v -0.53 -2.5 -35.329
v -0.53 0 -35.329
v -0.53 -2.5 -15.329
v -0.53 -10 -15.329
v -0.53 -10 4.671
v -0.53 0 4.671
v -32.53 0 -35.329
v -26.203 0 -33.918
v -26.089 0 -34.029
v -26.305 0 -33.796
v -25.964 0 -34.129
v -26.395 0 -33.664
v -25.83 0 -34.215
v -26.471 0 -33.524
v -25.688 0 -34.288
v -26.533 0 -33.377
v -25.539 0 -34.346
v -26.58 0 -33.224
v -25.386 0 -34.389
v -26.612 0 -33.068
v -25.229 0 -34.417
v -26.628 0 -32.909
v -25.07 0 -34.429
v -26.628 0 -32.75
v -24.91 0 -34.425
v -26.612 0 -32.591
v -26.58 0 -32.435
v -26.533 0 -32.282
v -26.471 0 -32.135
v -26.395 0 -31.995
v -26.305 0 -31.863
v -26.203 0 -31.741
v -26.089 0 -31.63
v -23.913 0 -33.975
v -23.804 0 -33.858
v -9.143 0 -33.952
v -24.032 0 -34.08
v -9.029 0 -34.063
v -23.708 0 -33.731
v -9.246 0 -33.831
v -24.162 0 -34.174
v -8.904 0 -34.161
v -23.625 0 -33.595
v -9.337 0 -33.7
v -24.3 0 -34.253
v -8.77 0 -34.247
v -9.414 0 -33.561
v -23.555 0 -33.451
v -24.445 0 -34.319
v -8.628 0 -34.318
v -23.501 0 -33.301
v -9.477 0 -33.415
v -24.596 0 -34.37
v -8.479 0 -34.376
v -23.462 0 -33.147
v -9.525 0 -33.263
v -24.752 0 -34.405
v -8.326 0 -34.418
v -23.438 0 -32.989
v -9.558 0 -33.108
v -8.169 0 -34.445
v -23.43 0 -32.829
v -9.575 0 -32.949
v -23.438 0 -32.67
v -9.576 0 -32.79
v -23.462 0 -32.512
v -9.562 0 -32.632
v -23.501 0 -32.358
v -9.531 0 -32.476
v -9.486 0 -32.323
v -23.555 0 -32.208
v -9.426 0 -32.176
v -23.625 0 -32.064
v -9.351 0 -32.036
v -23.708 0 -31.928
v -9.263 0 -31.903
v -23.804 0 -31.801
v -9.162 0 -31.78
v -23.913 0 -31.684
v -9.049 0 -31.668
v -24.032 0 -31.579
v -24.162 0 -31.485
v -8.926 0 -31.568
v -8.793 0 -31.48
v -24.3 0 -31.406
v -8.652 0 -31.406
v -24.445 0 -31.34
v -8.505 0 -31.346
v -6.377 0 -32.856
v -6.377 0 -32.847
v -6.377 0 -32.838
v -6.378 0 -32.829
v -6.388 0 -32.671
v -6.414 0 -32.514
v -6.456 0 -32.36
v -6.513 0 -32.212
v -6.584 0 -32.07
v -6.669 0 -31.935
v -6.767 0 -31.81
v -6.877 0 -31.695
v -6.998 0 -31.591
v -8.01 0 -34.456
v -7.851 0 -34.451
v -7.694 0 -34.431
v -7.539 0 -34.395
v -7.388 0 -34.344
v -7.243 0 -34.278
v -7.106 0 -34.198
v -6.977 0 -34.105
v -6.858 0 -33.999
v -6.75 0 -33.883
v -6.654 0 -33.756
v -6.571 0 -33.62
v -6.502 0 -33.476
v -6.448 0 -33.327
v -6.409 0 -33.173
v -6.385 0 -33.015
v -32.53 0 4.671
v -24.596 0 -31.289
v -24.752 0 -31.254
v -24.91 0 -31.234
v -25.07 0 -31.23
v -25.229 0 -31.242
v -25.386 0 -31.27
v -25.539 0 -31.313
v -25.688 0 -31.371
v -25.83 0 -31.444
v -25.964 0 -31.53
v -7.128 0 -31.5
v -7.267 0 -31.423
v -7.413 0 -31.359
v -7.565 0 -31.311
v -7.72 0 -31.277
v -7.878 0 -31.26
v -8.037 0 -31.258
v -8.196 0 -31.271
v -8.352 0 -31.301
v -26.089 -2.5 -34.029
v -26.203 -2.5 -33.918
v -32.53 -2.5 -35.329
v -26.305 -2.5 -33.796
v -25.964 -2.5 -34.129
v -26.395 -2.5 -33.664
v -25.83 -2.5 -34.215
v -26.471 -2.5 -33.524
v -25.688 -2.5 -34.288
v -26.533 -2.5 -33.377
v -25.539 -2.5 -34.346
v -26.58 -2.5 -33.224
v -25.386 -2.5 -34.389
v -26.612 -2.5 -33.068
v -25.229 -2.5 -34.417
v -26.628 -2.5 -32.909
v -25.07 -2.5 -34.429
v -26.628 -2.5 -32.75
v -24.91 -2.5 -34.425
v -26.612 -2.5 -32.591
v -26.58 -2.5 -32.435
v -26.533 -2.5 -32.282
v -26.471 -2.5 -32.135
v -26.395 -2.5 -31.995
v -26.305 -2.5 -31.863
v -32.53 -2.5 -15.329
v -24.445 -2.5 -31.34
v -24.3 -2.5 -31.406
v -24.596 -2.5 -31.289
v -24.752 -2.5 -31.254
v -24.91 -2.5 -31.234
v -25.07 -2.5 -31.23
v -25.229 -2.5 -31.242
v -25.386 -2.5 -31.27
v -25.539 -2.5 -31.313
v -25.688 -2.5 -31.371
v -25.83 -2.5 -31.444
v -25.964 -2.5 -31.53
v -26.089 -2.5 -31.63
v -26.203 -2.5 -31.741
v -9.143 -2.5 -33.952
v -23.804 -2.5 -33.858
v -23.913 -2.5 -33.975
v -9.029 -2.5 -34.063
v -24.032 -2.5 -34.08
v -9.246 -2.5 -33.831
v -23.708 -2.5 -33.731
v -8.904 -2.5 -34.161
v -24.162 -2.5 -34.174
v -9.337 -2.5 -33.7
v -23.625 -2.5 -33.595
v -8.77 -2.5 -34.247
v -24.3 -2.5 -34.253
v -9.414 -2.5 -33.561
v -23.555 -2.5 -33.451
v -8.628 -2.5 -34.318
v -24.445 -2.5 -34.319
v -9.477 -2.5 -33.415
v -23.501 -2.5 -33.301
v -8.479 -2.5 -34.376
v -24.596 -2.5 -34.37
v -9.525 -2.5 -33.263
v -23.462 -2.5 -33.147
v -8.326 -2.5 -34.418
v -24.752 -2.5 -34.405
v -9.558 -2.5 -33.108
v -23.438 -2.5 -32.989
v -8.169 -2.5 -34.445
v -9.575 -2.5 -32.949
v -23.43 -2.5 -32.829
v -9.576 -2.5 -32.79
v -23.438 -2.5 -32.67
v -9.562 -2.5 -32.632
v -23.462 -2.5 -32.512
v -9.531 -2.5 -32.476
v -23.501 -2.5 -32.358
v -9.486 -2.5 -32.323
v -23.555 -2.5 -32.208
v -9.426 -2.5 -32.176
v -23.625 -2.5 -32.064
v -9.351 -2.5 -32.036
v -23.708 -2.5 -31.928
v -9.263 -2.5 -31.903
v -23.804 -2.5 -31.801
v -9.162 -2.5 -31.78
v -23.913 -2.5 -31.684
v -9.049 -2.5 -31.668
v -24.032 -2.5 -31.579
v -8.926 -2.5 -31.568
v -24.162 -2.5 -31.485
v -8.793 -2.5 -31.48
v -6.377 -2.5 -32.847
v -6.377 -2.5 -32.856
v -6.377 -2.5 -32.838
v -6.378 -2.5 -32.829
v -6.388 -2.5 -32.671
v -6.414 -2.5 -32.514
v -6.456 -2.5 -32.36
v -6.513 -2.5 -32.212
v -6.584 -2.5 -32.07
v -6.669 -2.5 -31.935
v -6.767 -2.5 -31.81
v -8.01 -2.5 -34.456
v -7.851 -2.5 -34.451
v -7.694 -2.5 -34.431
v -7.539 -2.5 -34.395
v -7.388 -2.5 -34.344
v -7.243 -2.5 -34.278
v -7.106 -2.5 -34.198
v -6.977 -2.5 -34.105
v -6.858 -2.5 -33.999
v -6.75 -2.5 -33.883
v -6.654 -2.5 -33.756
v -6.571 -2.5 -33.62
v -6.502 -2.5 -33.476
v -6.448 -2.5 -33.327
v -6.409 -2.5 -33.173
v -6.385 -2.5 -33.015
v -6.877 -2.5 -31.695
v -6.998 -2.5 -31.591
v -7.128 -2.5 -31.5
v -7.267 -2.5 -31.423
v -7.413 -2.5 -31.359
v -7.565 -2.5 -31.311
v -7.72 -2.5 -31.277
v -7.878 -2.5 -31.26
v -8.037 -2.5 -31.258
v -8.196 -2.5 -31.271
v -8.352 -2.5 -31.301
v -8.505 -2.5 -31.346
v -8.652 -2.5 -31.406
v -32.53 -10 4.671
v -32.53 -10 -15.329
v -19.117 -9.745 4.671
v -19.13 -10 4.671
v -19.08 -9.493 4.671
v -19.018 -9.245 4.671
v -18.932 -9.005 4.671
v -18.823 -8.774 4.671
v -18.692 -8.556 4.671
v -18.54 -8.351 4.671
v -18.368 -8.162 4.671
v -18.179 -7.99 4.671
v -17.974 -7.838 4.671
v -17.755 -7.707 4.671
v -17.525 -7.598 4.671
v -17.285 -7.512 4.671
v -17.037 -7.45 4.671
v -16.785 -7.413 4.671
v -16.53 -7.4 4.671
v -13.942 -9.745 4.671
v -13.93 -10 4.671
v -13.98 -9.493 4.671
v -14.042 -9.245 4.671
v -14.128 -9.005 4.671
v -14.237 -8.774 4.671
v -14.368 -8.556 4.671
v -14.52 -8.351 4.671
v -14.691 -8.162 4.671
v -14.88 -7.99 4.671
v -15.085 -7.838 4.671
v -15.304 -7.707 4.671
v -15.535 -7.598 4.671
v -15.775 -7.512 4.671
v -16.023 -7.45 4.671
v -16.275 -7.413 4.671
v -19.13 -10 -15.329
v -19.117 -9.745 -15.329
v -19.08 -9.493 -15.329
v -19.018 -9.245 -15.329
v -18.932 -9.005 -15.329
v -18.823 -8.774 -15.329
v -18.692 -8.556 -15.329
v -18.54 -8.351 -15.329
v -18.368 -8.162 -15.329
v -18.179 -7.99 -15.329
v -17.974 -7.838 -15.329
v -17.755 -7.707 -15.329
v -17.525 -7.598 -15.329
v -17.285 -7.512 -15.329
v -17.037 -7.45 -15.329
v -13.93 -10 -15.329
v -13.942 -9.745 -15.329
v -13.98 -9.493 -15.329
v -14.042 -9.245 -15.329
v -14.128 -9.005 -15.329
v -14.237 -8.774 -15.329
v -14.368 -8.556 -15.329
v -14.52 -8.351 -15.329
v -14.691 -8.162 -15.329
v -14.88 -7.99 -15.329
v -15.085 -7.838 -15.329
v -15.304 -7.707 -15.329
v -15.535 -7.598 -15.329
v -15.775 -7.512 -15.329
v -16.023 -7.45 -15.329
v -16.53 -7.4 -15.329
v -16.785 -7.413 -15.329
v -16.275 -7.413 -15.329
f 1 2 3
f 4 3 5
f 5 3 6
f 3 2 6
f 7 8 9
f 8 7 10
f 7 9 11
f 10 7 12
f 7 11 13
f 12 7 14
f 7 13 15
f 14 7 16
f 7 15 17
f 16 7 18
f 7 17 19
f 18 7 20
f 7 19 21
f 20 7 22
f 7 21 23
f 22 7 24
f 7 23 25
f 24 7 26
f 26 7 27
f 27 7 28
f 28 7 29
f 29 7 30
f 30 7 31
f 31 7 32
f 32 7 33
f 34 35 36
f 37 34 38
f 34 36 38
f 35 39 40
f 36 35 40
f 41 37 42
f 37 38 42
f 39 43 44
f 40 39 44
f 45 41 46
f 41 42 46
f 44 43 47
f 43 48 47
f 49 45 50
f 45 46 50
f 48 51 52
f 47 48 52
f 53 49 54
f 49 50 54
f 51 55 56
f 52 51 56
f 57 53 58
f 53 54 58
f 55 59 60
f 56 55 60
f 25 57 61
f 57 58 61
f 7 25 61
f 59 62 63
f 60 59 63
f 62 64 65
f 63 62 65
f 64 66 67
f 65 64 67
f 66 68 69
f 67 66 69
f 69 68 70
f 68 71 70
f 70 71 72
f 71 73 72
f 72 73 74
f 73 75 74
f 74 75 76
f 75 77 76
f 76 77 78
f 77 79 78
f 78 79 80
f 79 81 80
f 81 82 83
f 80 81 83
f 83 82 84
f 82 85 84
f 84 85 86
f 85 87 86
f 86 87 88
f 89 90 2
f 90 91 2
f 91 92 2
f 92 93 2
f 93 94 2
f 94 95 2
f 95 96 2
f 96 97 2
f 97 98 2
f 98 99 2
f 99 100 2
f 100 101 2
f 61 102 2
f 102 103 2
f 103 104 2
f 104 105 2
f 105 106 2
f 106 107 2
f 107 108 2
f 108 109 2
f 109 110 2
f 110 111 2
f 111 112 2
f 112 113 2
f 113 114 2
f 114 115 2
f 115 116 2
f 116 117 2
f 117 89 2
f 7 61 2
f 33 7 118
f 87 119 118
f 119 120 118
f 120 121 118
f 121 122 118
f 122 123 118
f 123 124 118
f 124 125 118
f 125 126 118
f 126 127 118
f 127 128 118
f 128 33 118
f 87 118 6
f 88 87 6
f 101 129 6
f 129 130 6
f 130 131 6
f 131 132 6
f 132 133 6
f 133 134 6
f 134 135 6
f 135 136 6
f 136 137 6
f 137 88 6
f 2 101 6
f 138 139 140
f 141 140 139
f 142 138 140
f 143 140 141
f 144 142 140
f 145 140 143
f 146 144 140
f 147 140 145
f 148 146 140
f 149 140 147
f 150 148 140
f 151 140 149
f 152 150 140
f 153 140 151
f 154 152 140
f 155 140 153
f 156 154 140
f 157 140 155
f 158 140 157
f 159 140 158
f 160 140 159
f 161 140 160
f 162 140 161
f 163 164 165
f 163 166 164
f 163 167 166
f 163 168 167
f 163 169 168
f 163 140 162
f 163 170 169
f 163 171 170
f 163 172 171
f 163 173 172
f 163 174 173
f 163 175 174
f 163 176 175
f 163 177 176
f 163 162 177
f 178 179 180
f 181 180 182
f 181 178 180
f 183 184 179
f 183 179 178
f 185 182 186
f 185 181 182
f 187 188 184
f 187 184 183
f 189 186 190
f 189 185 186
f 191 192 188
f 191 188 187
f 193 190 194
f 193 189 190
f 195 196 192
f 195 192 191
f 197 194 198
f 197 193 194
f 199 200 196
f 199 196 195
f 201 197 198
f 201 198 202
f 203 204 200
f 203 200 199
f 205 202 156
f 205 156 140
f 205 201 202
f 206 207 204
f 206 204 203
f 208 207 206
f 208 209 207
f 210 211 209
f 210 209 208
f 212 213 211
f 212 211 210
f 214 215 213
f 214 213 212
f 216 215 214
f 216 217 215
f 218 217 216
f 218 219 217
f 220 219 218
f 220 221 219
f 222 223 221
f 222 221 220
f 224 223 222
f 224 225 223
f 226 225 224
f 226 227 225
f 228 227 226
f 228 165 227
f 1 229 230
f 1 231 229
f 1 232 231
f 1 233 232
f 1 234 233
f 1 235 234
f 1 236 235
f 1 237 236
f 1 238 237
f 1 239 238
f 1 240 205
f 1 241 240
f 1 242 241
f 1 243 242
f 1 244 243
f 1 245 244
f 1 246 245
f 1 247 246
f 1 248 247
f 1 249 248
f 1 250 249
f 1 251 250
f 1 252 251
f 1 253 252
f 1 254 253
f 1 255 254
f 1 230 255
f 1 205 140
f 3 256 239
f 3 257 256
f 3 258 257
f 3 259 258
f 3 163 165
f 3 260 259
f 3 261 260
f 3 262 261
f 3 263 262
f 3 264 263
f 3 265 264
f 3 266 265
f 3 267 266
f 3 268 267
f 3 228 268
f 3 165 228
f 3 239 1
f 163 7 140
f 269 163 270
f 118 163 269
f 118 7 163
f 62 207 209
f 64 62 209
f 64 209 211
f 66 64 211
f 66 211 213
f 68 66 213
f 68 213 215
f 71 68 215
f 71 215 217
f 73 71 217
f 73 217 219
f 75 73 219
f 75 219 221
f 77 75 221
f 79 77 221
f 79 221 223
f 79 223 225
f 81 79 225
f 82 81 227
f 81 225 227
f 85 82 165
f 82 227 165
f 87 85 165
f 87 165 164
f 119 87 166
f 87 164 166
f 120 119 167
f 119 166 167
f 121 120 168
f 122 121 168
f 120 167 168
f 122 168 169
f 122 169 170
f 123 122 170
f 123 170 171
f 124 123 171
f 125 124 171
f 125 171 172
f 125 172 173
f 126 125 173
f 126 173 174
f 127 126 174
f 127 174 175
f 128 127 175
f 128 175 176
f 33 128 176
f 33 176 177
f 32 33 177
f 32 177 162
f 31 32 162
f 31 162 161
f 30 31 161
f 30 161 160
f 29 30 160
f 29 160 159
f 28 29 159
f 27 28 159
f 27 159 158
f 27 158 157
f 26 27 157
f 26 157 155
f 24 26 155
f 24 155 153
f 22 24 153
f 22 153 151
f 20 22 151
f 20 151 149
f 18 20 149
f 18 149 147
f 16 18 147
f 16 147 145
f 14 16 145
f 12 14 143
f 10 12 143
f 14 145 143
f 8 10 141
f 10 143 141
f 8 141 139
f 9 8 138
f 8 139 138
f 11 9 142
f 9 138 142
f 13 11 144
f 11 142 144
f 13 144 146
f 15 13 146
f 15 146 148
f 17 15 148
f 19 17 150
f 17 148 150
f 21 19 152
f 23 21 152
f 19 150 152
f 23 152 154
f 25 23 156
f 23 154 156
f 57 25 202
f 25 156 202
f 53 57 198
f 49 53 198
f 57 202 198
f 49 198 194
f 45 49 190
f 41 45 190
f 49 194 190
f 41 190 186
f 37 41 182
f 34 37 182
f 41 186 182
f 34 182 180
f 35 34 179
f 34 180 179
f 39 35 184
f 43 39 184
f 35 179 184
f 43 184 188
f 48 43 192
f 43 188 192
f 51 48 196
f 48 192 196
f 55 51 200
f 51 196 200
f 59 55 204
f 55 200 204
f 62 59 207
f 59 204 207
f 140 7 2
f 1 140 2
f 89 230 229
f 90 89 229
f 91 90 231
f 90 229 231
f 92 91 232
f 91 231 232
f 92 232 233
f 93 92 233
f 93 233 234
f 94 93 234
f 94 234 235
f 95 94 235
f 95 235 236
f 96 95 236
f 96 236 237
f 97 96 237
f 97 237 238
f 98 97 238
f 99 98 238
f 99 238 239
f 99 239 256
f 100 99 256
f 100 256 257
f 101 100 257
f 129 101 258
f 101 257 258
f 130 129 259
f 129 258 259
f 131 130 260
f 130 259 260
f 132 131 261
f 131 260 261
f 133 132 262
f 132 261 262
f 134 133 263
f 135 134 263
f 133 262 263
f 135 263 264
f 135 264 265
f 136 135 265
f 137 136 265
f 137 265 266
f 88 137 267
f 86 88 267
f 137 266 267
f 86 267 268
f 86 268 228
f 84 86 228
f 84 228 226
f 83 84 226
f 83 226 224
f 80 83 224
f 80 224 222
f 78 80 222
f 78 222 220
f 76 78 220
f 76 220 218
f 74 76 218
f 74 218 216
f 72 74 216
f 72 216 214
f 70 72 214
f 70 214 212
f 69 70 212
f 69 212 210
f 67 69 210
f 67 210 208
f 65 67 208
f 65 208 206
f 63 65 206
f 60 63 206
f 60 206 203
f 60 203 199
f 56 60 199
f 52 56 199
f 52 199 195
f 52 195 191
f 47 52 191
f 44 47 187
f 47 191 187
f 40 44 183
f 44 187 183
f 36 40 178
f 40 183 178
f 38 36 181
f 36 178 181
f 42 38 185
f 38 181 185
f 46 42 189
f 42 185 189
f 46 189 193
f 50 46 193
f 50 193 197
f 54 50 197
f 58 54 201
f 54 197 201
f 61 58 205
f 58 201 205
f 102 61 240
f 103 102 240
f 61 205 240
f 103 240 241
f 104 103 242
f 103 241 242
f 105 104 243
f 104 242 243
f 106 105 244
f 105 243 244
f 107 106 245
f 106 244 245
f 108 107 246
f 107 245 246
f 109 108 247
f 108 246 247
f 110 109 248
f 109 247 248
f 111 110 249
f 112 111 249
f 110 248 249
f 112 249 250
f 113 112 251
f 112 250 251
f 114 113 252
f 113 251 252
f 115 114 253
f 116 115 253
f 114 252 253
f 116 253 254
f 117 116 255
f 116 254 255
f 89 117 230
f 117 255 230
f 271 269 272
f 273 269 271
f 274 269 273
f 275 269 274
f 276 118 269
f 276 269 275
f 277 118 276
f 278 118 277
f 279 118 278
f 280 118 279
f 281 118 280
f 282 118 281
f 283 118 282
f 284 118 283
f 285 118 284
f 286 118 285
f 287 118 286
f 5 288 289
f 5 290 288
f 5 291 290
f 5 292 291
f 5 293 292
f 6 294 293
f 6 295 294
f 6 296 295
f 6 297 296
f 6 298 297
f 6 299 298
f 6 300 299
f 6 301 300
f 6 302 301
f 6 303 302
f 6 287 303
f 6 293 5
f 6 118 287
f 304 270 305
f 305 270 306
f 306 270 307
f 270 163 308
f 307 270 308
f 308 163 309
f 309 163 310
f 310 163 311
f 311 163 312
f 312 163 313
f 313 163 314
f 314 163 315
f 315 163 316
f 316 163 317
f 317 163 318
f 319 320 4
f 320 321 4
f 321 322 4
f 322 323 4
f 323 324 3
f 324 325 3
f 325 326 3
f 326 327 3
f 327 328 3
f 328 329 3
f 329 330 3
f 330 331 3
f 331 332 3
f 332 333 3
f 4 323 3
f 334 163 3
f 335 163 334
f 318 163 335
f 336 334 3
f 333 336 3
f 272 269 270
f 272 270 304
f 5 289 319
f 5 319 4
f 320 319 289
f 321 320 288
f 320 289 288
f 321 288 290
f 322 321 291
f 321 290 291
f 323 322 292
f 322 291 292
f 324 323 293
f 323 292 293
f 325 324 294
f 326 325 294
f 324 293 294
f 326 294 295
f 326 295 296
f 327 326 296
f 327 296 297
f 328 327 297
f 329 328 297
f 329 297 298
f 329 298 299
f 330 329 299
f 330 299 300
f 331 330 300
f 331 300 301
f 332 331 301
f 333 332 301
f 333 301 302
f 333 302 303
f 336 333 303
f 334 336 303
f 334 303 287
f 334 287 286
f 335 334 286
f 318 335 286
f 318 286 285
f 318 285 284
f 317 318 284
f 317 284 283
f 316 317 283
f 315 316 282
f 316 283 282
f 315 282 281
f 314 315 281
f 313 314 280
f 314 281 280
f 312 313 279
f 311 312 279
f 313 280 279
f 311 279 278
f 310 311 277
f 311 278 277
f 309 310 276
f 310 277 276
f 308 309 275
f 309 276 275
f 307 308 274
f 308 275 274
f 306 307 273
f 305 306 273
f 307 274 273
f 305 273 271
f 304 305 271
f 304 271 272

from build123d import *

# Parameters (mm, degrees)
F0_W     = 32
F0_H     = 40
F1_DEPTH = 2.5
F2_W     = 32
F2_H     = 20
F3_DEPTH = 7.5
F4_R     = 1.6
F5_DEPTH = 2.501
F6_R     = 2.6
F7_DEPTH = 20


with BuildPart() as f1:
    # F0 (on Front) → F1 (new body)
    with BuildSketch(Plane.XZ):
        with Locations((-16.529805, -15.329495)):
            Rectangle(F0_W, F0_H)
    extrude(amount=F1_DEPTH)

    # F2 (on face) → F3 (join)
    with BuildSketch(Plane.XZ.offset(2.5)):
        with Locations((-16.529805, -5.329495)):
            Rectangle(F2_W, F2_H)
    extrude(amount=F3_DEPTH)

    # F4 (on face) → F5 (cut, through all)
    with BuildSketch(Plane.XZ.offset(2.5)):
        with Locations((-25.029805, -32.829495)):
            Circle(F4_R)
        with BuildLine():
            ThreePointArc((-6.37738, -32.856394), (-6.377437, -32.842944), (-6.377607, -32.829495))
            ThreePointArc((-6.377607, -32.829495), (-9.577324, -32.869844), (-6.37738, -32.856394))
        make_face()
    extrude(amount=-F5_DEPTH, mode=Mode.SUBTRACT)

    # F6 (on face) → F7 (cut, through all)
    with BuildSketch(Plane.XY.offset(4.670505)):
        with Locations((-16.529805, -10)):
            Circle(F6_R)
    extrude(amount=-F7_DEPTH, mode=Mode.SUBTRACT)


solid = f1.part
